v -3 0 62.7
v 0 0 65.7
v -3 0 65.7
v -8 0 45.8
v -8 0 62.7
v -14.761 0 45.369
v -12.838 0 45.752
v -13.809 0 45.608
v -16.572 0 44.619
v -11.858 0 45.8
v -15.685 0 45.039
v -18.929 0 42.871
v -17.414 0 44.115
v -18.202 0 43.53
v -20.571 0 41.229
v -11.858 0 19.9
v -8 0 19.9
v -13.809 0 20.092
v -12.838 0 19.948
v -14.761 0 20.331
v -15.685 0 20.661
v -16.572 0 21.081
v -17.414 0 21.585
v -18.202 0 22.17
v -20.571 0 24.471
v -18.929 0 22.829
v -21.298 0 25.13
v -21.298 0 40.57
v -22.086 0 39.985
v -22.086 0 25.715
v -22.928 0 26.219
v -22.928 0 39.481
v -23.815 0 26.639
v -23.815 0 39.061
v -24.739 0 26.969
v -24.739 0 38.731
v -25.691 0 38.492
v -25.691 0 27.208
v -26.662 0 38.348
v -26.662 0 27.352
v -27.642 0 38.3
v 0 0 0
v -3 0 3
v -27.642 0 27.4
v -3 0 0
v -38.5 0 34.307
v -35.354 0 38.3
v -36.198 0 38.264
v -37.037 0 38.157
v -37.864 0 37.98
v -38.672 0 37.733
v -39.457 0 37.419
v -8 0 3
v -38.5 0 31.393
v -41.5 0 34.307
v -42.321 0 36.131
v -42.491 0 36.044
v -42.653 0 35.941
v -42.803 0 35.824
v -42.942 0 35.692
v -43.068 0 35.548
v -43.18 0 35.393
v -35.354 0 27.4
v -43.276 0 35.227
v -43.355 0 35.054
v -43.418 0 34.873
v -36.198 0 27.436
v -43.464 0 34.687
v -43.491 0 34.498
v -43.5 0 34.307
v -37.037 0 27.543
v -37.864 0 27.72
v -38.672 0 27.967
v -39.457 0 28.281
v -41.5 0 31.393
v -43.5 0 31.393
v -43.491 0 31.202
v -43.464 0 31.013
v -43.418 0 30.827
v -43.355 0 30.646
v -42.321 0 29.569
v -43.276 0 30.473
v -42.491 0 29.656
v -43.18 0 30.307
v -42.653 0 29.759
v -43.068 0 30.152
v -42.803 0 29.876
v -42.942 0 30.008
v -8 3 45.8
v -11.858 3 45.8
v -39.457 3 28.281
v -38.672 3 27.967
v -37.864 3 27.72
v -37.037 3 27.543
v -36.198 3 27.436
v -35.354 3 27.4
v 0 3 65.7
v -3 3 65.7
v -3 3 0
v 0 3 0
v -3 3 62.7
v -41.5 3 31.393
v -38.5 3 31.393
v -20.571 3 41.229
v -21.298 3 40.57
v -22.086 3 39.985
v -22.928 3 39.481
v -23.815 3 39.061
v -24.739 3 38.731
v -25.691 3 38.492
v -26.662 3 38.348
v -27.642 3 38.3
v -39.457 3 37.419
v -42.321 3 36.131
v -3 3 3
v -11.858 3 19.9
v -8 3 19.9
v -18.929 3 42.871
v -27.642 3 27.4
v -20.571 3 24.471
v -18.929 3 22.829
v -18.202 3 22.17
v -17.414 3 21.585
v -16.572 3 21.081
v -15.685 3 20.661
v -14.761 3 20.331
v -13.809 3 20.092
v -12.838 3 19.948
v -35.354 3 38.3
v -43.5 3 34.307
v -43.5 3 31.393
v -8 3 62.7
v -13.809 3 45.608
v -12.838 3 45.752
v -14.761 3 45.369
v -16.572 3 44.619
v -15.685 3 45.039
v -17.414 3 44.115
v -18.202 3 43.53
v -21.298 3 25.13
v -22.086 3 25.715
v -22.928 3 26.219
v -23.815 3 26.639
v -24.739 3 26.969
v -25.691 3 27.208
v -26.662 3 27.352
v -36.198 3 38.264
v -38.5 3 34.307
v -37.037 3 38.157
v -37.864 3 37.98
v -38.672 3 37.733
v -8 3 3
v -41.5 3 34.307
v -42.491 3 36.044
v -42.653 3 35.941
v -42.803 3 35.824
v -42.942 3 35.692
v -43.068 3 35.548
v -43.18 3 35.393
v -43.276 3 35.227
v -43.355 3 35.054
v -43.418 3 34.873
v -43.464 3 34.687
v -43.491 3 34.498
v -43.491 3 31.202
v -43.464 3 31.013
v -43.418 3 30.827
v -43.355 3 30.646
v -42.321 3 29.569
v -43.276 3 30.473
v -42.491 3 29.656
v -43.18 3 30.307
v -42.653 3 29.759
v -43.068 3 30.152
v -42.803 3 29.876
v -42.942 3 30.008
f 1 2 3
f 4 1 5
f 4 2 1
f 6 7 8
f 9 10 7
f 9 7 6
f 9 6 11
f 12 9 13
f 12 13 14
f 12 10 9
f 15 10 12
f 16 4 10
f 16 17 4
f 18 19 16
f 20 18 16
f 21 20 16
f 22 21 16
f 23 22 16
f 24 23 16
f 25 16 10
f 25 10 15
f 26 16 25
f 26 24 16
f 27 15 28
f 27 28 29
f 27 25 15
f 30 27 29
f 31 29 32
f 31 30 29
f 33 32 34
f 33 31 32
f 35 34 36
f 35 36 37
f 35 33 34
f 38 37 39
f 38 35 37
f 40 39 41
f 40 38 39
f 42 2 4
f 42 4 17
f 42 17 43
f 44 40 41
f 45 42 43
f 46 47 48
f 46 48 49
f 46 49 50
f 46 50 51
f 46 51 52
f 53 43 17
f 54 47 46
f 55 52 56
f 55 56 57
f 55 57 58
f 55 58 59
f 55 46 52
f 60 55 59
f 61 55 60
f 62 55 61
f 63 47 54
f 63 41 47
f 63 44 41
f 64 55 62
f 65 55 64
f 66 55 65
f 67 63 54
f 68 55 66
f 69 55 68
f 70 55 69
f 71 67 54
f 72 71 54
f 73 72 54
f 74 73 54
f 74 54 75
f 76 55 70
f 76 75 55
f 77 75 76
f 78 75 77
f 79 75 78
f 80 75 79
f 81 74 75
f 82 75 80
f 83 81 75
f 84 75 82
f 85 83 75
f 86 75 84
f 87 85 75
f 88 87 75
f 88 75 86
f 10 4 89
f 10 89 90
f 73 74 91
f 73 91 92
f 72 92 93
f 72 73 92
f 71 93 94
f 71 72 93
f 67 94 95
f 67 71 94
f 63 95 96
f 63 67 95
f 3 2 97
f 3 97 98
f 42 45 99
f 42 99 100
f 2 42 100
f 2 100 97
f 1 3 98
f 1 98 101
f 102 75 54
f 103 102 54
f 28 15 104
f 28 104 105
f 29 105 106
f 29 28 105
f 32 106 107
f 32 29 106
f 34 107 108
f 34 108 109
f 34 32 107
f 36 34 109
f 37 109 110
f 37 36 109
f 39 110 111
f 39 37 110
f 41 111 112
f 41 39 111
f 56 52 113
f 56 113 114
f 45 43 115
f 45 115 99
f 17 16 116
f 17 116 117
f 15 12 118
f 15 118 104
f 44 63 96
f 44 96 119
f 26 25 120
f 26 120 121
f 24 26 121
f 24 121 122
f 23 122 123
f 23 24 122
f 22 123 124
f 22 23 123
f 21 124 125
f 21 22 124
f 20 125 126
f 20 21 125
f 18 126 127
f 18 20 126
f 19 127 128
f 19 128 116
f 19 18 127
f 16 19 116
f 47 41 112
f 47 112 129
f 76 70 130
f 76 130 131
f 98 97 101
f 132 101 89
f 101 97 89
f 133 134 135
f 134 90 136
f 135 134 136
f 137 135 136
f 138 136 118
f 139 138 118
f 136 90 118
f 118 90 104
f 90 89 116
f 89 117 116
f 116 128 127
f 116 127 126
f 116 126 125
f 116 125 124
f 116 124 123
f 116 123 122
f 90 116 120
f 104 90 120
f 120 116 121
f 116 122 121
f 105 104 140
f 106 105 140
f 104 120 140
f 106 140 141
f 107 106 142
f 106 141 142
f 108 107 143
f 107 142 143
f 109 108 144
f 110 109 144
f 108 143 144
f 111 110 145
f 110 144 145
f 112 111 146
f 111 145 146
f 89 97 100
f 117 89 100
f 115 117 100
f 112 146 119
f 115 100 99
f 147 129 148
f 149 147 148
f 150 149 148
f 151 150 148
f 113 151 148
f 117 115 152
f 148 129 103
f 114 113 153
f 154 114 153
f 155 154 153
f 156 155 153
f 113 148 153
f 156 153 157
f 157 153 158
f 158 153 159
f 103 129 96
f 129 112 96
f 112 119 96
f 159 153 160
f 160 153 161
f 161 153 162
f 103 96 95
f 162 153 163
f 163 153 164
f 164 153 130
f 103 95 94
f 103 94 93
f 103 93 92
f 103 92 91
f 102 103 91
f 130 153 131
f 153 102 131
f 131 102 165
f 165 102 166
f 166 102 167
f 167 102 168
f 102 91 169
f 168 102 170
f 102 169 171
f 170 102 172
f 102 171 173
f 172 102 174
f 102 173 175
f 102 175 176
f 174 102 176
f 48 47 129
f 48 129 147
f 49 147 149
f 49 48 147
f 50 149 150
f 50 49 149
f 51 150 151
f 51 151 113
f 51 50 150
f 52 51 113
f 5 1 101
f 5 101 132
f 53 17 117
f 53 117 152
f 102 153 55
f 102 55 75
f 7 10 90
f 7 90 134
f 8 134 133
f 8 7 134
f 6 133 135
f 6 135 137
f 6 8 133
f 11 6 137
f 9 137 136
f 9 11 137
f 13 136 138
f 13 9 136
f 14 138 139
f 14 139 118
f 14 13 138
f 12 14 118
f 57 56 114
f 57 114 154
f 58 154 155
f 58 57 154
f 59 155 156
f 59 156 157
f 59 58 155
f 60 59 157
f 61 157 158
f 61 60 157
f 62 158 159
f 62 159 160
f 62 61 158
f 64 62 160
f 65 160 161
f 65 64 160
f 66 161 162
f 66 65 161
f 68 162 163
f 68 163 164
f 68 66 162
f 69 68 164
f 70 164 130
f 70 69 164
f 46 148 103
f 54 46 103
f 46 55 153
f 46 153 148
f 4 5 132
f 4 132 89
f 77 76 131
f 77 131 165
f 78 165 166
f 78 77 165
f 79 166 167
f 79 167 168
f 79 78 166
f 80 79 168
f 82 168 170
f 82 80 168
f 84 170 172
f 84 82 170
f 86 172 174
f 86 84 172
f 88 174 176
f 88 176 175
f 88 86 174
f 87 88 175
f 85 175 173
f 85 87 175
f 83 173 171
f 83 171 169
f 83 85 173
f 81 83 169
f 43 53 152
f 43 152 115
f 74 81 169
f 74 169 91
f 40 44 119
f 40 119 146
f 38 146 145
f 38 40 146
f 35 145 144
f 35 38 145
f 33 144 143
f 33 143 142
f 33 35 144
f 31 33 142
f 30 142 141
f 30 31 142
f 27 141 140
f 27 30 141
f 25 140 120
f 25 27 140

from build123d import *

# Parameters (mm, degrees)
SKETCH1_W           = 3
SKETCH1_H           = 2.91365756
BOSS_EXTRUDE1_DEPTH = 3


with BuildPart() as part:
    # Sketch1 → Boss-Extrude1 (new body)
    with BuildSketch(Plane(origin=(0, 0, 0), x_dir=(1, 0, 0), z_dir=(0, 1, 0))):
        with BuildLine():
            Line((-8, -45.8), (-11.857864376, -45.8))
            ThreePointArc((-11.857864376, -45.8), (-15.6846987, -45.038795325), (-18.928932188, -42.871067812))
            Line((-18.928932188, -42.871067812), (-20.571067812, -41.228932188))
            ThreePointArc((-20.571067812, -41.228932188), (-23.8153013, -39.061204675), (-27.642135624, -38.3))
            Line((-27.642135624, -38.3), (-35.353653112, -38.3))
            ThreePointArc((-35.353653112, -38.3), (-37.452206123, -38.077324545), (-39.457299885, -37.419215052))
            Line((-39.457299885, -37.419215052), (-42.320729355, -36.13067179))
            ThreePointArc((-42.320729355, -36.13067179), (-43.179502711, -35.392771065), (-43.5, -34.30682878))
            Line((-43.5, -34.30682878), (-43.5, -31.39317122))
            ThreePointArc((-43.5, -31.39317122), (-43.179502711, -30.307228935), (-42.320729355, -29.56932821))
            Line((-42.320729355, -29.56932821), (-39.457299885, -28.280784948))
            ThreePointArc((-39.457299885, -28.280784948), (-37.452206123, -27.622675455), (-35.353653112, -27.4))
            Line((-35.353653112, -27.4), (-27.642135624, -27.4))
            ThreePointArc((-27.642135624, -27.4), (-23.8153013, -26.638795325), (-20.571067812, -24.471067812))
            Line((-20.571067812, -24.471067812), (-18.928932188, -22.828932188))
            ThreePointArc((-18.928932188, -22.828932188), (-15.6846987, -20.661204675), (-11.857864376, -19.9))
            Line((-11.857864376, -19.9), (-8, -19.9))
            Line((-8, -19.9), (-8, -3))
            Line((-8, -3), (-3, -3))
            Line((-3, -3), (-3, 0))
            Line((-3, 0), (0, 0))
            Line((0, 0), (0, -65.7))
            Line((0, -65.7), (-3, -65.7))
            Line((-3, -65.7), (-3, -62.7))
            Line((-3, -62.7), (-8, -62.7))
            Line((-8, -62.7), (-8, -45.8))
        make_face()
        with Locations((-40, -32.85)):
            Rectangle(SKETCH1_W, SKETCH1_H, mode=Mode.SUBTRACT)
    extrude(amount=BOSS_EXTRUDE1_DEPTH)


solid = part.part
